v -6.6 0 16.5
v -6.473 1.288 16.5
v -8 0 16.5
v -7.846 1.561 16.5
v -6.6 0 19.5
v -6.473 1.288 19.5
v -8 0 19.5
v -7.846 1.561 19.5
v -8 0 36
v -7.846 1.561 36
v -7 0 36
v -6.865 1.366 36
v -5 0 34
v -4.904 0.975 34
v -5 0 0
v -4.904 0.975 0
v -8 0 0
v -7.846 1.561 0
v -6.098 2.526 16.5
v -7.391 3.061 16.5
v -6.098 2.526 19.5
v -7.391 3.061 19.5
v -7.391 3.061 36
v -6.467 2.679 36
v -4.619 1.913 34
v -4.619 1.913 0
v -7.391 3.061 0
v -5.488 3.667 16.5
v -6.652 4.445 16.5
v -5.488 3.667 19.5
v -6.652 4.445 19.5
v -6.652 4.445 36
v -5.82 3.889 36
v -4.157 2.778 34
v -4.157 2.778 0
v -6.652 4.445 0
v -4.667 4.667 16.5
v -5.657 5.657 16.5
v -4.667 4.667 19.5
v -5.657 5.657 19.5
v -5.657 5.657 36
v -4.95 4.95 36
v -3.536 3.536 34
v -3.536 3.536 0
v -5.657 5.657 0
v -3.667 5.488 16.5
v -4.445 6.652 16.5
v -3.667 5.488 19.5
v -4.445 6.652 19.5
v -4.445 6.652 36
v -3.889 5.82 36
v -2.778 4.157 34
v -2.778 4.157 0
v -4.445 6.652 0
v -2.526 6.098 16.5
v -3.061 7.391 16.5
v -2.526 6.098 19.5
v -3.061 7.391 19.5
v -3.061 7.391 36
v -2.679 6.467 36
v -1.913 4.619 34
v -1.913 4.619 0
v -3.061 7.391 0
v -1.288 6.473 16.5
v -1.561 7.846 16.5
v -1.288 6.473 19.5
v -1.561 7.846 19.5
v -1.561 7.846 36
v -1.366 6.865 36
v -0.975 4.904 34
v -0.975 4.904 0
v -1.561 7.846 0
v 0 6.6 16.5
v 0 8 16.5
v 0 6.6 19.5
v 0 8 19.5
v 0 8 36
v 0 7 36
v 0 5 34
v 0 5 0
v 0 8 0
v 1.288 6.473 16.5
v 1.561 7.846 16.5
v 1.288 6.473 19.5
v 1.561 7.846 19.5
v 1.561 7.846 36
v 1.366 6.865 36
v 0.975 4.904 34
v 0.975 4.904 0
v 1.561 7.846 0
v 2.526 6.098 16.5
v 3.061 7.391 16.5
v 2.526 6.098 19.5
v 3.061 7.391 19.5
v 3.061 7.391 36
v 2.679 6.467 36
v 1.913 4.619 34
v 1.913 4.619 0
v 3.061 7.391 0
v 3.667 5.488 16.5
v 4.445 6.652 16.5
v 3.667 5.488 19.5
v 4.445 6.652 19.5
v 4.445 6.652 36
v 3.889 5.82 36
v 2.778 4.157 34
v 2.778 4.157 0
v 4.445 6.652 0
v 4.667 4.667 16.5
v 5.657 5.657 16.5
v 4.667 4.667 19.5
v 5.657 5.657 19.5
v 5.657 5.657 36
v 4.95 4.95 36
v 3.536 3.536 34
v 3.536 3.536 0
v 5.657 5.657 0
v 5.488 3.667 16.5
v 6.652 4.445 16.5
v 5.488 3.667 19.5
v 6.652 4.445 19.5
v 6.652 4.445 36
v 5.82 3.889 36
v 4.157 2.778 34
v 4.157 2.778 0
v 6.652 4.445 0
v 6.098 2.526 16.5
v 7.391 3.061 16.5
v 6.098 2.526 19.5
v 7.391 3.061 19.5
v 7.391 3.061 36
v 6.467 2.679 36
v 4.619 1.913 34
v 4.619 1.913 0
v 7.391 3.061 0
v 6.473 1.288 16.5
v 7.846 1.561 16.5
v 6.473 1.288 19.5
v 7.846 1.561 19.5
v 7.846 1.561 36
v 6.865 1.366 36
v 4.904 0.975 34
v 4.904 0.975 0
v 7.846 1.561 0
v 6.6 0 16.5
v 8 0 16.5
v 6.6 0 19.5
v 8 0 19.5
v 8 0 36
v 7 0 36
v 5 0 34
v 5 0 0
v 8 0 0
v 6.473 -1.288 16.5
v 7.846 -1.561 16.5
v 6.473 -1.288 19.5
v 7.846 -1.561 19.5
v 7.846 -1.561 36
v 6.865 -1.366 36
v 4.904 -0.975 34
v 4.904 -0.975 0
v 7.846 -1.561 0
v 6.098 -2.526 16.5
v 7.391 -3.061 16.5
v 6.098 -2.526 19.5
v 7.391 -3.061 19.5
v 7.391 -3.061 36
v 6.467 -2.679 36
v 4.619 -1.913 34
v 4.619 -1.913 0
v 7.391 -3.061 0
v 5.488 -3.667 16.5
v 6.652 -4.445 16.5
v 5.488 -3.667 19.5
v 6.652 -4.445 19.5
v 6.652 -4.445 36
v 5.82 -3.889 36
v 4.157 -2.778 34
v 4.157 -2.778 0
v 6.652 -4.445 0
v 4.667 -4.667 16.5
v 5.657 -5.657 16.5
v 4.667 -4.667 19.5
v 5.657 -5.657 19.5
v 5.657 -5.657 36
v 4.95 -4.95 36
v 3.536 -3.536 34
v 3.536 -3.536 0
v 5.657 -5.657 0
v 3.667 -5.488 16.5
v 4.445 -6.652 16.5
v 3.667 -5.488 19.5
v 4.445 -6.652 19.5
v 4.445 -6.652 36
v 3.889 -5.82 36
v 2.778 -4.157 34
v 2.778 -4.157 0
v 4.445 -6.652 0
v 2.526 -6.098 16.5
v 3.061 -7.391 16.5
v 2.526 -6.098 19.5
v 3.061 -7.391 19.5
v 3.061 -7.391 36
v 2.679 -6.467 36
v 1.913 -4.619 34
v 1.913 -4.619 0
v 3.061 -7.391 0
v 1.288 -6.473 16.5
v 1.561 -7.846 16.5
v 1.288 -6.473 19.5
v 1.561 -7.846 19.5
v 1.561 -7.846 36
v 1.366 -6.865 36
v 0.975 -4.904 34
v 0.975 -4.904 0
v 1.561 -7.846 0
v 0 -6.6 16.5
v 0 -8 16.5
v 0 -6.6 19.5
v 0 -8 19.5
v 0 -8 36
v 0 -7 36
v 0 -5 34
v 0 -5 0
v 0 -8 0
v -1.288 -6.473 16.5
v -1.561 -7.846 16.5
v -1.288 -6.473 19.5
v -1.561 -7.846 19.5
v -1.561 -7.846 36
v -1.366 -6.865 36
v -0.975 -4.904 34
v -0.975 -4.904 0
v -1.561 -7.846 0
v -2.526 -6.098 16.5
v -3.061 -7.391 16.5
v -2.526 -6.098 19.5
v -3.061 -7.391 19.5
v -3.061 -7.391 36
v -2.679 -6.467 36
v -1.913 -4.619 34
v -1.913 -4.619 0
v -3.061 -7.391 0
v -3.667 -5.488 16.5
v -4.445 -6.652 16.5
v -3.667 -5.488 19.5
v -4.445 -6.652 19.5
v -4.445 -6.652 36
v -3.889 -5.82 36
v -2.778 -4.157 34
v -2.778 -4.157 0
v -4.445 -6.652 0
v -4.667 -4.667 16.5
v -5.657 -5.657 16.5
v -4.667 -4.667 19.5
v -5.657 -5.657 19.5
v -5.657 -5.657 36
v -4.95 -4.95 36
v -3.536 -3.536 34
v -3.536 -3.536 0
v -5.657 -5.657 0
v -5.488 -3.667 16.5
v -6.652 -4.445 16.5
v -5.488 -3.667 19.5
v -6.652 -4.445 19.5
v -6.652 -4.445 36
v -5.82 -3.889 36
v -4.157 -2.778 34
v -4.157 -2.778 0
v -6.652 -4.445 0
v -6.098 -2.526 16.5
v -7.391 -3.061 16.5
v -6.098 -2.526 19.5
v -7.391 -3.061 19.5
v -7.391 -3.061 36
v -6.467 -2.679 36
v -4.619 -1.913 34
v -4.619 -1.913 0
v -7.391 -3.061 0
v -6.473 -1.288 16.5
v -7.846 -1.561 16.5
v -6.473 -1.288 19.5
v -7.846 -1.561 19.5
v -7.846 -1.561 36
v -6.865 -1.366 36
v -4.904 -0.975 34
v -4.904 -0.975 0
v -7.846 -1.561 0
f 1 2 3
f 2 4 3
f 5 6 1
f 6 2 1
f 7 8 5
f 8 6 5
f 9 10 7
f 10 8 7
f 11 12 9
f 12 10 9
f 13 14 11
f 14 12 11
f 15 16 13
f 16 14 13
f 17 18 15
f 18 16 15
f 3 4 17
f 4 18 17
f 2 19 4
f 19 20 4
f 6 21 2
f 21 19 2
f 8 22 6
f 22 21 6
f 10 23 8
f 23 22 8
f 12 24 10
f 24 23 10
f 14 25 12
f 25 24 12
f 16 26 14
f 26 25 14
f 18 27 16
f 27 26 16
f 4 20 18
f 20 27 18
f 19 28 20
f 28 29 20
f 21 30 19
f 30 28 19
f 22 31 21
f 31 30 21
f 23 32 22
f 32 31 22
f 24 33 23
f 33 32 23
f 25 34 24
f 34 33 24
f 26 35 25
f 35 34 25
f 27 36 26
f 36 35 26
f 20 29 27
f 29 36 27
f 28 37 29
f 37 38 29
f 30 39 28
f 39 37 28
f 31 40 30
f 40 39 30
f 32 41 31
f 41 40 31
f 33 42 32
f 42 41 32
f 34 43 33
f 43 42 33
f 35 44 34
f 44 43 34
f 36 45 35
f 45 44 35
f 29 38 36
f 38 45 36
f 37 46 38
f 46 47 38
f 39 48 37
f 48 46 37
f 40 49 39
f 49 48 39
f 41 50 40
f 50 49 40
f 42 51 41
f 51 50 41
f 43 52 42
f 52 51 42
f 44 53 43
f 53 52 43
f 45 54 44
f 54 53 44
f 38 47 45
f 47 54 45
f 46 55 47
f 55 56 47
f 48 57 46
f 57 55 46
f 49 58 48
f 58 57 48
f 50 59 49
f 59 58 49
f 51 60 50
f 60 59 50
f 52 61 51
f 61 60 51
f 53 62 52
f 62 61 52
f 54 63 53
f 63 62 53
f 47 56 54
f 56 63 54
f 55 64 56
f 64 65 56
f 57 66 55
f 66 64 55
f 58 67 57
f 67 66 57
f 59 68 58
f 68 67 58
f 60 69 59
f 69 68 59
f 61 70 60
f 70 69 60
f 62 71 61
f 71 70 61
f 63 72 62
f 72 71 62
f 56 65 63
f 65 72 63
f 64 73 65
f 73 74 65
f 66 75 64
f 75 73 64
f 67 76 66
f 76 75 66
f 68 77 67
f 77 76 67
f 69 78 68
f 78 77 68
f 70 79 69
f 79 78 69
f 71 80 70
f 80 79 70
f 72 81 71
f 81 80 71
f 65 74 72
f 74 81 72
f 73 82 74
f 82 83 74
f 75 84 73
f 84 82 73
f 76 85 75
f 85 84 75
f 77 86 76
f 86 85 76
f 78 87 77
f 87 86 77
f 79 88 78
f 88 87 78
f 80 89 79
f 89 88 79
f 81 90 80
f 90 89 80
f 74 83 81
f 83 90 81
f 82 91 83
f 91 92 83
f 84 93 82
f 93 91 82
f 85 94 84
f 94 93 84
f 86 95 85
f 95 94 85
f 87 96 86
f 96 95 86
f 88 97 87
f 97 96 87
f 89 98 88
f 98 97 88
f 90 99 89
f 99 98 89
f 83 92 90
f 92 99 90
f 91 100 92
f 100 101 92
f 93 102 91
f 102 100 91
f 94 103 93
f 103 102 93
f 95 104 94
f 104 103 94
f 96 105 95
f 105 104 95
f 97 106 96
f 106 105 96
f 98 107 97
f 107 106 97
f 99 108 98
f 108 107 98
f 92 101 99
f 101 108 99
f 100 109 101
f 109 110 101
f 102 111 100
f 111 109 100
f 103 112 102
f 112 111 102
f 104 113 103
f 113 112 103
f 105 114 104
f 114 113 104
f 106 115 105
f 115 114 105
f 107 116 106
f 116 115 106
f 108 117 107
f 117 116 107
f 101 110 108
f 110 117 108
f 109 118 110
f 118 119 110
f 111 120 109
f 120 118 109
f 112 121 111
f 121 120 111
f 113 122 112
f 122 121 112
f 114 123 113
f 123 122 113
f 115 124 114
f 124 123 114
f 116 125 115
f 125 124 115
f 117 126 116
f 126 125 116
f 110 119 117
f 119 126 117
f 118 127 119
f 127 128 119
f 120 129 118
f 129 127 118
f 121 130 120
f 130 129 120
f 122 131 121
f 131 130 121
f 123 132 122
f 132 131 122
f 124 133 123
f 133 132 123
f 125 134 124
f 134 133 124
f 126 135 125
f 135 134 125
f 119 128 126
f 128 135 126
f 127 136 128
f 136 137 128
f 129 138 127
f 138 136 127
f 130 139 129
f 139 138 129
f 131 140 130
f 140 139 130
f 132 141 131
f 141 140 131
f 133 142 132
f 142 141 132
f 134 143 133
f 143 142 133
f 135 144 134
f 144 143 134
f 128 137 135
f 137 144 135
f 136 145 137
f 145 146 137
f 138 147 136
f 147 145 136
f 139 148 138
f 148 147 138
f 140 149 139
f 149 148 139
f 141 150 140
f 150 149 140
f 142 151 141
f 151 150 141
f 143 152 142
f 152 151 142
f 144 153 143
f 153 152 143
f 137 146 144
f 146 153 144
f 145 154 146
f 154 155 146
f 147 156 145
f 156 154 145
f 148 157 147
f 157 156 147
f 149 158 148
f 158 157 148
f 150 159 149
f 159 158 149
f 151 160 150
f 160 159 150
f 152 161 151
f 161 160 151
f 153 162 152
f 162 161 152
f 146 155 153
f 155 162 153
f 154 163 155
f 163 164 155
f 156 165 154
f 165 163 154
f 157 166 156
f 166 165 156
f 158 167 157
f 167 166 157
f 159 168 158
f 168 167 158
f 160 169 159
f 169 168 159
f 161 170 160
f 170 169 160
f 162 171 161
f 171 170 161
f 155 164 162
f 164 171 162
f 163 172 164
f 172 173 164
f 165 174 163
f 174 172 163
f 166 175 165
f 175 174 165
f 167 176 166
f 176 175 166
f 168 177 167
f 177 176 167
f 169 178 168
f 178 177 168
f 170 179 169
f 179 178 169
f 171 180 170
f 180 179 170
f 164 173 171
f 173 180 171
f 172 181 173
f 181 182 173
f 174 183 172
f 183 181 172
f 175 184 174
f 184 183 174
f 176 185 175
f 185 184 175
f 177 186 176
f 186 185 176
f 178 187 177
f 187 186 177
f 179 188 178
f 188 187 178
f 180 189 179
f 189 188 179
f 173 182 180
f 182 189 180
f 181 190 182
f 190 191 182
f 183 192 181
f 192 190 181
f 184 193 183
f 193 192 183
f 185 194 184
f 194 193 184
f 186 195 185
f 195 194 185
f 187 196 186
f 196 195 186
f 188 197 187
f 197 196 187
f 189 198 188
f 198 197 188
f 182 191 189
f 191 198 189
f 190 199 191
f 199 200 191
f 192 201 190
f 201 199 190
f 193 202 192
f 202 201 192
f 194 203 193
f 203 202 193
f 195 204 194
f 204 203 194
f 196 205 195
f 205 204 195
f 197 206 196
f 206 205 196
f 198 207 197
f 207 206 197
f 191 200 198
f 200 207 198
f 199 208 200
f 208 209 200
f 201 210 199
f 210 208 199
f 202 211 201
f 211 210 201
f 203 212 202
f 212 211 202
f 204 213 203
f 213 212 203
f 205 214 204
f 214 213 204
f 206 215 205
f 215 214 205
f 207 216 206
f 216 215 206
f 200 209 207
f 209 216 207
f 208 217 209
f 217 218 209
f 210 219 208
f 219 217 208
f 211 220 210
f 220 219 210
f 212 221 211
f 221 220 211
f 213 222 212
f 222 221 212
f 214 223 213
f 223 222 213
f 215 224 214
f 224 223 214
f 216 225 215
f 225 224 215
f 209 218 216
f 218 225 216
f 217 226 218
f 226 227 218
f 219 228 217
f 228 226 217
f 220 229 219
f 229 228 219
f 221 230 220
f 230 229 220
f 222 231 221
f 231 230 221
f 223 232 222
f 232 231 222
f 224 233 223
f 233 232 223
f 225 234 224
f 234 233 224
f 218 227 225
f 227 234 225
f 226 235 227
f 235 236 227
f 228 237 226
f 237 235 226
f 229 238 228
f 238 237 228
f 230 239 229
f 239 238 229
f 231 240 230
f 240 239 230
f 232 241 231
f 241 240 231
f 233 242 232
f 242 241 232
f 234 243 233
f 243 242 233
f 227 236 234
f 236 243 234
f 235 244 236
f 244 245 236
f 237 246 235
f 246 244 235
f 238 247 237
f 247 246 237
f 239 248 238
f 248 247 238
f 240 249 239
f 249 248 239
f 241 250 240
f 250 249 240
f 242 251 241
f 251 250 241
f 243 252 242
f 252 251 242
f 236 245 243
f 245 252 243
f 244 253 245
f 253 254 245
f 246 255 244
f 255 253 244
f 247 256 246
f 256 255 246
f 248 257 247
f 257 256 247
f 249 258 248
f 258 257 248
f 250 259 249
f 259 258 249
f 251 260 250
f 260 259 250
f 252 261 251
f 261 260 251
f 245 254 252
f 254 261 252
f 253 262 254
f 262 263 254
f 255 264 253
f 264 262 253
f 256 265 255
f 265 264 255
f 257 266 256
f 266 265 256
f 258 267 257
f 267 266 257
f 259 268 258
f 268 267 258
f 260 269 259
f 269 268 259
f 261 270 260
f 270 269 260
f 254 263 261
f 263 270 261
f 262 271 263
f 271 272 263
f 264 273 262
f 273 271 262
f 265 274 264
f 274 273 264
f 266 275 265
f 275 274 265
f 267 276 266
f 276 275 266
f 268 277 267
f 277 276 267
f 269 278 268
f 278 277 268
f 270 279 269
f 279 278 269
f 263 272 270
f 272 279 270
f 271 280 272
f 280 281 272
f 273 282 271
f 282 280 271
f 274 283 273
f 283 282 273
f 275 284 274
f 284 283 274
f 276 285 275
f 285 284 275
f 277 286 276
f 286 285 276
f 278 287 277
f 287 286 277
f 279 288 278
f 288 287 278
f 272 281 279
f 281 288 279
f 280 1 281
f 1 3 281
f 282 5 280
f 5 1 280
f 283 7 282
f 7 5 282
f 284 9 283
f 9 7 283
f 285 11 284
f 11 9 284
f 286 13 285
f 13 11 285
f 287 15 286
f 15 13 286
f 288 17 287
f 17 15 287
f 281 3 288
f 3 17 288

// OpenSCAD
$fn = 32;

// ----------------------------------------------------------------------
// Grooved revolve: thread_relief, bore R5
// ----------------------------------------------------------------------

// --- parameters (mm) ---
bore_r = 5;               // bore radius
outer_r = 8;              // outer radius of the body
total_h = 36;             // overall height, Z
wall = 3;                 // radial wall thickness
groove_w = 3;             // groove width
groove_d = 1.4;           // groove depth
grooves = 1;              // number of outer grooves
relief = 2;               // thread relief leg at the bore mouth
relief_angle = 45;        // thread relief chamfer angle, degrees

bbox_x = 2 * outer_r;  // full diameter
bore_d = 2 * bore_r;  // bore diameter
body_d = 2 * outer_r;  // body diameter
revolve_angle = 360;  // full turn around the Z axis

profile = [[5, 0], [8, 0], [8, 16.5], [6.6, 16.5], [6.6, 19.5], [8, 19.5], [8, 36], [7, 36], [5, 34]];  // primary outline, 9 points, counter clockwise

// --- the one profile operation ---
rotate_extrude(angle = revolve_angle) polygon(points = profile);
